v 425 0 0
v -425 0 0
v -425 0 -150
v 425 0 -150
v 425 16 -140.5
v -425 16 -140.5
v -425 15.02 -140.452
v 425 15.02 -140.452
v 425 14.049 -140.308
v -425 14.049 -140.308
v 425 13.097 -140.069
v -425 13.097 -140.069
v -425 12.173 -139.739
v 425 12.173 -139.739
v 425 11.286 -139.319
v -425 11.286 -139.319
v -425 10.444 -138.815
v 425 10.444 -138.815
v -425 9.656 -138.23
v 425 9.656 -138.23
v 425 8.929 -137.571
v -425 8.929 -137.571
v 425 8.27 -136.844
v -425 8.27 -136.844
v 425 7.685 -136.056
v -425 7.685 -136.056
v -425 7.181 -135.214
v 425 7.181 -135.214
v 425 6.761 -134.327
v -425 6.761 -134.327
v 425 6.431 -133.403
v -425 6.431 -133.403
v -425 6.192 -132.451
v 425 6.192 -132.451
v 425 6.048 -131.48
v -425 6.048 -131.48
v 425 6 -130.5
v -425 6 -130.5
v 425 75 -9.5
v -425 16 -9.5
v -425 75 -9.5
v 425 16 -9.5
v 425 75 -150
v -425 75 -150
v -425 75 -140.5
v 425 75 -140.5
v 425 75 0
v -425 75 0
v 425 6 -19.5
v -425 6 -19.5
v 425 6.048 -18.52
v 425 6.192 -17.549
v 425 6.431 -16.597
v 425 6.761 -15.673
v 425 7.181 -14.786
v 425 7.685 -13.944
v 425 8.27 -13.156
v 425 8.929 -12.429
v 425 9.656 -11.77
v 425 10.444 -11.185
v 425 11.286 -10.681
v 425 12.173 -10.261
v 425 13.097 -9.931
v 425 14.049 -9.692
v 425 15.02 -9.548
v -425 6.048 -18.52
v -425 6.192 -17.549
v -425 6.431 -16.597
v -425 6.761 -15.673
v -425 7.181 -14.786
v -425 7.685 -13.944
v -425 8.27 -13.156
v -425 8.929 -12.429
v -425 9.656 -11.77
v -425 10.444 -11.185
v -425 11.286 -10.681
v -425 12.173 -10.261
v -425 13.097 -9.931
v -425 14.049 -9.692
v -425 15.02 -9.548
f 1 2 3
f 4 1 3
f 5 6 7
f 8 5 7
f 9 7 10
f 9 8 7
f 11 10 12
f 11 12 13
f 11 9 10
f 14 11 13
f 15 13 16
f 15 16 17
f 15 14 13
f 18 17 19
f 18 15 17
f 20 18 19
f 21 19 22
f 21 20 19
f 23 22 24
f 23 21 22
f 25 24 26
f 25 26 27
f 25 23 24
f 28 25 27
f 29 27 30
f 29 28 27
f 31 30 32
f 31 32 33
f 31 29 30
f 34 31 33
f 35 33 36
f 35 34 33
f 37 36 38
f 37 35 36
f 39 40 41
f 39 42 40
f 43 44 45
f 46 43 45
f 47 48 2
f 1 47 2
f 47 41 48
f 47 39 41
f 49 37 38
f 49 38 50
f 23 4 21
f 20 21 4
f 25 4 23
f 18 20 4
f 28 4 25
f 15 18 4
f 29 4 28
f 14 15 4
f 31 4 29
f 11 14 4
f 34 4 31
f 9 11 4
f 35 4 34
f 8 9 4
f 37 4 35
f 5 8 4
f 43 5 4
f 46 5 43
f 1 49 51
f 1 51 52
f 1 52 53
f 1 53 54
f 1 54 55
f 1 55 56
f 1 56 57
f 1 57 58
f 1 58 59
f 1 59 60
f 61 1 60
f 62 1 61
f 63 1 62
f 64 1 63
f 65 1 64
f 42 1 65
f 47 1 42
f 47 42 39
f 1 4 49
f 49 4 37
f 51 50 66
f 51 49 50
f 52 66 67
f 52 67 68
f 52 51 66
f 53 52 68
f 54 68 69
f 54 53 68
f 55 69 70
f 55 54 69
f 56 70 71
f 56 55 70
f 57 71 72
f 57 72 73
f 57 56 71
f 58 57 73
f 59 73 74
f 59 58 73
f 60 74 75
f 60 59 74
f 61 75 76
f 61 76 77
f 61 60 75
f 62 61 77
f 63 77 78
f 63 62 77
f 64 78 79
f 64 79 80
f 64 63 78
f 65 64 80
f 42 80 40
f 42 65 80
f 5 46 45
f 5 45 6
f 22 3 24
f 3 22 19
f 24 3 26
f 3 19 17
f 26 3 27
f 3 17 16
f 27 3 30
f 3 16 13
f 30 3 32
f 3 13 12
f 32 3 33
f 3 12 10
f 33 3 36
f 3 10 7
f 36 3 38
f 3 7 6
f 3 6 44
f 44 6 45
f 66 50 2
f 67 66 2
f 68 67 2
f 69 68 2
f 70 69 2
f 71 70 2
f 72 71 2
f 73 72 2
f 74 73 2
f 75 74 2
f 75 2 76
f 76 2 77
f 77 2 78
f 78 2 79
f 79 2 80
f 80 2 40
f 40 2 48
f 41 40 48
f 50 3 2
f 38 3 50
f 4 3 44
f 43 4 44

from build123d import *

# Parameters (mm, degrees)
F1_DEPTH = 425


with BuildPart() as f1:
    # F0 (on Right) → F1 (new body, symmetric)
    with BuildSketch(Plane.YZ):
        with BuildLine():
            Line((75, -9.5), (75, 0))
            Line((75, 0), (0, 0))
            Line((0, 0), (0, -150))
            Line((0, -150), (75, -150))
            Line((75, -150), (75, -140.5))
            Line((75, -140.5), (16, -140.5))
            ThreePointArc((16, -140.5), (8.928932, -137.571068), (6, -130.5))
            Line((6, -130.5), (6, -19.5))
            ThreePointArc((6, -19.5), (8.928932, -12.428932), (16, -9.5))
            Line((16, -9.5), (75, -9.5))
        make_face()
    extrude(amount=F1_DEPTH, both=True)


solid = f1.part
